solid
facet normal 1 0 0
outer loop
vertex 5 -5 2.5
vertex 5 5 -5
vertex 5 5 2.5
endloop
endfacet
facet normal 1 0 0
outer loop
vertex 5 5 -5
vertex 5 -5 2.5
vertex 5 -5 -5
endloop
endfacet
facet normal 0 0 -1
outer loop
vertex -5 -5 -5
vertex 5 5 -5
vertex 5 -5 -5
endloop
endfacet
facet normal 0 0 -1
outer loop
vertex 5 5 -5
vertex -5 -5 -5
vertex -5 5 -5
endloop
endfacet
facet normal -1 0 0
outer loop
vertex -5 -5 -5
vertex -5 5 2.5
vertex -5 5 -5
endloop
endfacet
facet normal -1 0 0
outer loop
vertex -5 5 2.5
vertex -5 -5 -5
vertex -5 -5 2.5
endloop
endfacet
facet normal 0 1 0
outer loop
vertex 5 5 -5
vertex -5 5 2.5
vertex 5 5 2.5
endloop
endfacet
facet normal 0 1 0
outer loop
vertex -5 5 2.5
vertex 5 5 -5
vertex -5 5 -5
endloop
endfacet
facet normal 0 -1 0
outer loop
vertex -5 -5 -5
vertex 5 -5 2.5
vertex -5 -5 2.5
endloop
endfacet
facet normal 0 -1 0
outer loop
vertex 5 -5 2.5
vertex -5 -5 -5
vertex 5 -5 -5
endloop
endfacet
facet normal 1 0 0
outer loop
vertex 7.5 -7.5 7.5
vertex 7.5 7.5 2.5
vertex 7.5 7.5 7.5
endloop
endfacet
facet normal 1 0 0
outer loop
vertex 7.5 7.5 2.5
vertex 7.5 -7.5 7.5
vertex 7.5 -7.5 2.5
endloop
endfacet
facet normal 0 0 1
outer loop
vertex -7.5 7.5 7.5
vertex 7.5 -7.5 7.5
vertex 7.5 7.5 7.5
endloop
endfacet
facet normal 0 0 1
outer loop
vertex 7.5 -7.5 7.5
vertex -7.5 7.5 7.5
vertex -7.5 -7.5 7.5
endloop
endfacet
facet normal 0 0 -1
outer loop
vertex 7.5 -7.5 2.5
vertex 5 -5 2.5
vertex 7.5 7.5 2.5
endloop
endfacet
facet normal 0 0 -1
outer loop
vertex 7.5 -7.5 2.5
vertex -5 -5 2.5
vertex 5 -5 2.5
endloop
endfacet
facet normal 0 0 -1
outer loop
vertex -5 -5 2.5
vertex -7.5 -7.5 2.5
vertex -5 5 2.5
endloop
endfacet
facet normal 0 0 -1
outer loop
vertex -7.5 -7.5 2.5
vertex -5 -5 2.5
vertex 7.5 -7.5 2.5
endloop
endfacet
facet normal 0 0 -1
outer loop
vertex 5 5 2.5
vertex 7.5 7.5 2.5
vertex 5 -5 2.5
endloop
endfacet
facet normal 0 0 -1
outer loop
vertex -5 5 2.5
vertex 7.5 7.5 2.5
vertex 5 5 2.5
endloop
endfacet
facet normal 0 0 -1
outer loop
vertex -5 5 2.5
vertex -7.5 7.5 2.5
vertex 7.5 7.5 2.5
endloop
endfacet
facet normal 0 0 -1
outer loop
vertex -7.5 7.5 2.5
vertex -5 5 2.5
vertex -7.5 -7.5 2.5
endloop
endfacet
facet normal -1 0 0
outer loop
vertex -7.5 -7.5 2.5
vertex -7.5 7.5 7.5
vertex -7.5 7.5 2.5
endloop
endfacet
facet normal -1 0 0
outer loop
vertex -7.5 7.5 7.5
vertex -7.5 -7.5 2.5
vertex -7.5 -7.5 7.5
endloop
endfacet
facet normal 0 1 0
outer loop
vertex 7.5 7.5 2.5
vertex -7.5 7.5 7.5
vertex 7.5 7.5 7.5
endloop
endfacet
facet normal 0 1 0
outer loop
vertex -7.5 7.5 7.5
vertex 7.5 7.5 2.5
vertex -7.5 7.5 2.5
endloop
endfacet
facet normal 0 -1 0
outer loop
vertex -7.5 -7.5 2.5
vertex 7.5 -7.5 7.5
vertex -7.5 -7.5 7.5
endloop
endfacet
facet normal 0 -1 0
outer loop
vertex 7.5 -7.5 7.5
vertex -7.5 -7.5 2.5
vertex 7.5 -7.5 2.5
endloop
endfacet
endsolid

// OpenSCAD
// Dimensions
cube_W = 10;
cube_L = 10;
cube_H = 10;

hat_W = cube_W * 1.5;
hat_L = cube_L * 1.5;
hat_H = cube_H / 2;
hat_offset = cube_H / 2;

// base cube
color("red") {
    cube([cube_W, cube_L, cube_H], center = true);
}

// top cube (hat)
translate([0, 0, hat_offset]) {
    color("blue") {
        cube([hat_W, hat_L, hat_H], center = true);
    }
}
